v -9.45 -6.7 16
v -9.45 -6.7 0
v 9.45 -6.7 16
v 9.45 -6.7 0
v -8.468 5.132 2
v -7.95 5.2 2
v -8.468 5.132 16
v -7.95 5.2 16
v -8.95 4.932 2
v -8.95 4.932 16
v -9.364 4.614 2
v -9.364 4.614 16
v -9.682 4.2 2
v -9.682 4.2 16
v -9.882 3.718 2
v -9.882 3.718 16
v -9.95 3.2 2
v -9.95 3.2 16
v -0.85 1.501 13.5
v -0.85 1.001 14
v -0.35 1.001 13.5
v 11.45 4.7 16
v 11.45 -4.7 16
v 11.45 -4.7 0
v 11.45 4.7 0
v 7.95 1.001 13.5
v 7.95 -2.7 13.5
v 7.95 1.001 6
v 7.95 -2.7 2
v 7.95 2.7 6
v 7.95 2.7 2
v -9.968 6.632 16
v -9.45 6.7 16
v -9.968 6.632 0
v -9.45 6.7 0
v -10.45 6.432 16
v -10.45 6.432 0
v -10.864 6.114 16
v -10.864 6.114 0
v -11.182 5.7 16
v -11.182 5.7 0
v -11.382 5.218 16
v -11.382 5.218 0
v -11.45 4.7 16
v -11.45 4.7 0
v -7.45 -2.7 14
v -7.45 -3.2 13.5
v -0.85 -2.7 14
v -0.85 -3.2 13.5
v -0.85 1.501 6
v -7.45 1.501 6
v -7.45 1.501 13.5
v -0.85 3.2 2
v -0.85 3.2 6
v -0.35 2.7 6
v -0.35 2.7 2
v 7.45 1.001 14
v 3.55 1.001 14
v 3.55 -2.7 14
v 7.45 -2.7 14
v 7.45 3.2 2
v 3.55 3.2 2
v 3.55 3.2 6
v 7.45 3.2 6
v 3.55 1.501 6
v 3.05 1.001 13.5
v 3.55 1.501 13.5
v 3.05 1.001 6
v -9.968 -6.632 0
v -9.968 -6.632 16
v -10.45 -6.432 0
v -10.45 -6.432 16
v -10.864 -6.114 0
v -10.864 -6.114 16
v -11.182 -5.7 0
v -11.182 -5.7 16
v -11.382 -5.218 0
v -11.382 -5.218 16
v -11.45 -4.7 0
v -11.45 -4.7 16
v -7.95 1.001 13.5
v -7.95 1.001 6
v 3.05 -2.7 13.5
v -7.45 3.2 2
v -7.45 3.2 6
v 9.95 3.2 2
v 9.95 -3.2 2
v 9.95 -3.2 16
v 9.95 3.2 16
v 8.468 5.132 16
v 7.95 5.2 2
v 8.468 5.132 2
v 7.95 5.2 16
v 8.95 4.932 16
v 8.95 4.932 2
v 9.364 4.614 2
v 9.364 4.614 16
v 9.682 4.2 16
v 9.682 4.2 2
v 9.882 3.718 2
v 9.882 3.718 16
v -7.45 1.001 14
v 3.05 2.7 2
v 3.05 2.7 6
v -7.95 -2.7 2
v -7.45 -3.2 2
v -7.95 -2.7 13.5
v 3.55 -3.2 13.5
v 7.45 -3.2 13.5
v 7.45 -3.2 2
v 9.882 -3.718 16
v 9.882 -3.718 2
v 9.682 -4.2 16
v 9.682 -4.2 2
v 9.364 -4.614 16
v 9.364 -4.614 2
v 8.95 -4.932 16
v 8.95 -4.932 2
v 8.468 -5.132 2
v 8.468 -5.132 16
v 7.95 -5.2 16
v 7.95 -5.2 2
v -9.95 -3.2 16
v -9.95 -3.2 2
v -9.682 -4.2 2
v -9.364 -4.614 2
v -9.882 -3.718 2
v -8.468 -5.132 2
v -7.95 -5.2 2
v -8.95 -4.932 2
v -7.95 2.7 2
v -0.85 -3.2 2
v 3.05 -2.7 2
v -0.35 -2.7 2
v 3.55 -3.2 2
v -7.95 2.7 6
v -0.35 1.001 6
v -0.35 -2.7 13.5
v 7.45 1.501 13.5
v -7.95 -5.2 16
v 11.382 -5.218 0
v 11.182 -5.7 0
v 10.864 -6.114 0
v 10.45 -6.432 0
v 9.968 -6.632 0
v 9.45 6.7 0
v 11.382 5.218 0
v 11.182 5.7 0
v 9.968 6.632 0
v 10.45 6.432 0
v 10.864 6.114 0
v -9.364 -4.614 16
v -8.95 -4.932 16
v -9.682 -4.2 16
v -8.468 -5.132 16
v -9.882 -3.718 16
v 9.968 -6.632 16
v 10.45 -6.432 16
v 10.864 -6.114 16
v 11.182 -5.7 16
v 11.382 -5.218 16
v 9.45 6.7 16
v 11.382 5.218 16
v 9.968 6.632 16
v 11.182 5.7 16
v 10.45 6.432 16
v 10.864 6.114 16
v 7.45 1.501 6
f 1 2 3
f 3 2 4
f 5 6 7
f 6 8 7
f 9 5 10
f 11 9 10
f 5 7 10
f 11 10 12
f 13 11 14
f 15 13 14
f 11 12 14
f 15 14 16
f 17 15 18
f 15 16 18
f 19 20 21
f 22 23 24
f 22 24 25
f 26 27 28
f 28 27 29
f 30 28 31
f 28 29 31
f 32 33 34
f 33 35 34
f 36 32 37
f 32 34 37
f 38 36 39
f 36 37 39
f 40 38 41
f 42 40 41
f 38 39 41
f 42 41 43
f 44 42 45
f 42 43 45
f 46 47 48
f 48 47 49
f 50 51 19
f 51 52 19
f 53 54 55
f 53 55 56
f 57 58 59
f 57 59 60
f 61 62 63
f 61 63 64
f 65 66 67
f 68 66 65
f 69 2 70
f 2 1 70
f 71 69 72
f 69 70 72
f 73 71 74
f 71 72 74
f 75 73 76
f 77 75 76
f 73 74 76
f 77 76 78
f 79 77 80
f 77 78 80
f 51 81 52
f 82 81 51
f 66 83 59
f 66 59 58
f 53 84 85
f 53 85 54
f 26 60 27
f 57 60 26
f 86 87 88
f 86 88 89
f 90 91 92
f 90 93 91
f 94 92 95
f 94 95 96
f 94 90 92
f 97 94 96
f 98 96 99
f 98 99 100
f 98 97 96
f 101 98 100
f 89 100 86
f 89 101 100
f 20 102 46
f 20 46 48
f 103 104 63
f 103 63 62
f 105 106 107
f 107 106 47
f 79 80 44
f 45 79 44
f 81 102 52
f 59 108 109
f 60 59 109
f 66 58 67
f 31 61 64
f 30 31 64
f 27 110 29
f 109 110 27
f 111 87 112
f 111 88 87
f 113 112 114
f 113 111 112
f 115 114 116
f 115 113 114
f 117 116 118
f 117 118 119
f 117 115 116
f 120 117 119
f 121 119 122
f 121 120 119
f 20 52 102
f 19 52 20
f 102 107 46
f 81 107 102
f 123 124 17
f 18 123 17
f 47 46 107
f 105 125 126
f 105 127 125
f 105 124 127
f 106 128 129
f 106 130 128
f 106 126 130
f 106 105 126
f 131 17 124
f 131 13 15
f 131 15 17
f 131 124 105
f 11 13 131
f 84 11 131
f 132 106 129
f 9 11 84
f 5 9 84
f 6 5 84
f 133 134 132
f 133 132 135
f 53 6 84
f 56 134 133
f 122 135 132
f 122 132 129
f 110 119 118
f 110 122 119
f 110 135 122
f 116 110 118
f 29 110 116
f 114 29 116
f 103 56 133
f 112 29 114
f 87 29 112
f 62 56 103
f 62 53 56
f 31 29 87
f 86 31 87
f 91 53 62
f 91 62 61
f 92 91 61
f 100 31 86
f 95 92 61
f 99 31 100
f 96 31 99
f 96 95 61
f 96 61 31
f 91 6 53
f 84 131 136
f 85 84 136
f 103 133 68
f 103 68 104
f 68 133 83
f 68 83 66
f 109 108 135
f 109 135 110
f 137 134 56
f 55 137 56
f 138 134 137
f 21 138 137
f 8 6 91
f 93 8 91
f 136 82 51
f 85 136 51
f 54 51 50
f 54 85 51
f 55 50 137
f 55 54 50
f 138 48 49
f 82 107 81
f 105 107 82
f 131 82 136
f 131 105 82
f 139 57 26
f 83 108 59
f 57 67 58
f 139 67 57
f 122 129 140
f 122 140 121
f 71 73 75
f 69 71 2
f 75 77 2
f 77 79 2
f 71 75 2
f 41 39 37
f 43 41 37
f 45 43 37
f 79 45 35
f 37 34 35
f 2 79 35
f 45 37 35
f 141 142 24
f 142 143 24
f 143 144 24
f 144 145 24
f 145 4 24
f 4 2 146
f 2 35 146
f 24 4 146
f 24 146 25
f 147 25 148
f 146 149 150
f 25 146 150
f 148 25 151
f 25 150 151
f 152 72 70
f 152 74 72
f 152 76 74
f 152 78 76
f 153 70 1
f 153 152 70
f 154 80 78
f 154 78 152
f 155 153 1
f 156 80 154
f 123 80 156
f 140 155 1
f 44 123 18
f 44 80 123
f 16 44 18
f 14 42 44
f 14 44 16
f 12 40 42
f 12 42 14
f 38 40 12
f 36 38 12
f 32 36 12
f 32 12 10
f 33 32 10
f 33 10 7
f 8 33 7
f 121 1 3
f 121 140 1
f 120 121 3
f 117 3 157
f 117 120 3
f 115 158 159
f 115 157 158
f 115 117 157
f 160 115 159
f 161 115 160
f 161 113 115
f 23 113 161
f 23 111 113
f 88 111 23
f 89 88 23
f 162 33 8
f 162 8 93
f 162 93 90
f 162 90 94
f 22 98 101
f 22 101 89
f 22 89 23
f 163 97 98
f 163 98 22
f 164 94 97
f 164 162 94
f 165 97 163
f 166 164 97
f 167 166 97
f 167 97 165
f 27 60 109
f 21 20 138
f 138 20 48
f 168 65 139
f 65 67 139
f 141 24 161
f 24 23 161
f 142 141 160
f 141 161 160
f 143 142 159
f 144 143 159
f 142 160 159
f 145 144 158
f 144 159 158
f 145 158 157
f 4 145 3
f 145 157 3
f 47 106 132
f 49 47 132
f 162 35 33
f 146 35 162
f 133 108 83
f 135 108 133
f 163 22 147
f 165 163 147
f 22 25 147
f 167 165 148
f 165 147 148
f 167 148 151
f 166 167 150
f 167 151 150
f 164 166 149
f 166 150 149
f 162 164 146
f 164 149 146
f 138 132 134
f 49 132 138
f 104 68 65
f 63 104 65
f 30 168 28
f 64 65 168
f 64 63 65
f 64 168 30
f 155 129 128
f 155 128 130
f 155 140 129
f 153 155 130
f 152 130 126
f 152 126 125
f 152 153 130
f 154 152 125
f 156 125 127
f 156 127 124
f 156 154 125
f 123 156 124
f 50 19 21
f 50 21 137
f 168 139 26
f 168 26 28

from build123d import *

# Parameters (mm, degrees)
F0_W     = 22.9
F0_H     = 13.4
F1_DEPTH = 2
F2_W     = 22.9
F2_H     = 13.4
F2_W_2   = 19.9
F2_H_2   = 10.4
F3_DEPTH = 14
F4_W     = 15.9
F4_H     = 6.4
F5_DEPTH = 12
F6_W     = 7.6
F6_H     = 1.698620432
F6_W_2   = 4.9
F7_DEPTH = 8
F8_W     = 3.4
F8_H     = 6.4
F9_DEPTH = 4
F10_SIZE = 0.5
F11_R    = 2


with BuildPart() as f1:
    # F0 (on Top) → F1 (new body)
    with BuildSketch(Plane.XY):
        Rectangle(F0_W, F0_H)
    extrude(amount=F1_DEPTH)

    # F2 (on face) → F3 (join)
    with BuildSketch(Plane.XY.offset(2)):
        Rectangle(F2_W, F2_H)
        Rectangle(F2_W_2, F2_H_2, mode=Mode.SUBTRACT)
    extrude(amount=F3_DEPTH)

    # F4 (on face) → F5 (join)
    with BuildSketch(Plane.XY.offset(2)):
        Rectangle(F4_W, F4_H)
    extrude(amount=F5_DEPTH)

    # F6 (on face) → F7 (cut)
    with BuildSketch(Plane.XY.offset(14)):
        with Locations((-4.15, 2.350689784)):
            Rectangle(F6_W, F6_H)
        Polygon((-0.35, 3.2), (-0.35, 1.501379568), (-0.35, -3.2), (3.05, -3.2), (3.05, 1.501379568), (3.05, 3.2), align=None)
        with Locations((5.5, 2.350689784)):
            Rectangle(F6_W_2, F6_H)
    extrude(amount=-F7_DEPTH, mode=Mode.SUBTRACT)

    # F8 (on face) → F9 (cut)
    with BuildSketch(Plane.XY.offset(6)):
        with Locations((1.35, 0)):
            Rectangle(F8_W, F8_H)
    extrude(amount=-F9_DEPTH, mode=Mode.SUBTRACT)

    # F10
    f10_edges = [f1.edges().sort_by_distance(p)[0] for p in [
        (-4.15, 1.50138, 14),
        (-0.35, -0.84931, 14),
        (-4.15, -3.2, 14),
        (-7.95, -0.84931, 14),
        (-7.95, 1.50138, 10),
        (-0.35, 1.50138, 10),
        (-0.35, -3.2, 8),
        (3.05, -3.2, 8),
        (7.95, -0.84931, 14),
        (5.5, -3.2, 14),
        (3.05, -0.84931, 14),
        (5.5, 1.50138, 14),
        (7.95, 1.50138, 10),
        (3.05, 1.50138, 10),
        (3.05, 3.2, 4),
        (7.95, 3.2, 4),
        (7.95, -3.2, 8),
        (-0.35, 3.2, 4),
        (-7.95, 3.2, 4),
        (-7.95, -3.2, 8),
    ]]
    chamfer(f10_edges, length=F10_SIZE)

    # F11
    f11_edges = [f1.edges().sort_by_distance(p)[0] for p in [
        (9.95, -5.2, 9),
        (9.95, 5.2, 9),
        (-9.95, 5.2, 9),
        (-9.95, -5.2, 9),
        (11.45, -6.7, 8),
        (11.45, 6.7, 8),
        (-11.45, 6.7, 8),
        (-11.45, -6.7, 8),
    ]]
    fillet(f11_edges, radius=F11_R)


solid = f1.part
